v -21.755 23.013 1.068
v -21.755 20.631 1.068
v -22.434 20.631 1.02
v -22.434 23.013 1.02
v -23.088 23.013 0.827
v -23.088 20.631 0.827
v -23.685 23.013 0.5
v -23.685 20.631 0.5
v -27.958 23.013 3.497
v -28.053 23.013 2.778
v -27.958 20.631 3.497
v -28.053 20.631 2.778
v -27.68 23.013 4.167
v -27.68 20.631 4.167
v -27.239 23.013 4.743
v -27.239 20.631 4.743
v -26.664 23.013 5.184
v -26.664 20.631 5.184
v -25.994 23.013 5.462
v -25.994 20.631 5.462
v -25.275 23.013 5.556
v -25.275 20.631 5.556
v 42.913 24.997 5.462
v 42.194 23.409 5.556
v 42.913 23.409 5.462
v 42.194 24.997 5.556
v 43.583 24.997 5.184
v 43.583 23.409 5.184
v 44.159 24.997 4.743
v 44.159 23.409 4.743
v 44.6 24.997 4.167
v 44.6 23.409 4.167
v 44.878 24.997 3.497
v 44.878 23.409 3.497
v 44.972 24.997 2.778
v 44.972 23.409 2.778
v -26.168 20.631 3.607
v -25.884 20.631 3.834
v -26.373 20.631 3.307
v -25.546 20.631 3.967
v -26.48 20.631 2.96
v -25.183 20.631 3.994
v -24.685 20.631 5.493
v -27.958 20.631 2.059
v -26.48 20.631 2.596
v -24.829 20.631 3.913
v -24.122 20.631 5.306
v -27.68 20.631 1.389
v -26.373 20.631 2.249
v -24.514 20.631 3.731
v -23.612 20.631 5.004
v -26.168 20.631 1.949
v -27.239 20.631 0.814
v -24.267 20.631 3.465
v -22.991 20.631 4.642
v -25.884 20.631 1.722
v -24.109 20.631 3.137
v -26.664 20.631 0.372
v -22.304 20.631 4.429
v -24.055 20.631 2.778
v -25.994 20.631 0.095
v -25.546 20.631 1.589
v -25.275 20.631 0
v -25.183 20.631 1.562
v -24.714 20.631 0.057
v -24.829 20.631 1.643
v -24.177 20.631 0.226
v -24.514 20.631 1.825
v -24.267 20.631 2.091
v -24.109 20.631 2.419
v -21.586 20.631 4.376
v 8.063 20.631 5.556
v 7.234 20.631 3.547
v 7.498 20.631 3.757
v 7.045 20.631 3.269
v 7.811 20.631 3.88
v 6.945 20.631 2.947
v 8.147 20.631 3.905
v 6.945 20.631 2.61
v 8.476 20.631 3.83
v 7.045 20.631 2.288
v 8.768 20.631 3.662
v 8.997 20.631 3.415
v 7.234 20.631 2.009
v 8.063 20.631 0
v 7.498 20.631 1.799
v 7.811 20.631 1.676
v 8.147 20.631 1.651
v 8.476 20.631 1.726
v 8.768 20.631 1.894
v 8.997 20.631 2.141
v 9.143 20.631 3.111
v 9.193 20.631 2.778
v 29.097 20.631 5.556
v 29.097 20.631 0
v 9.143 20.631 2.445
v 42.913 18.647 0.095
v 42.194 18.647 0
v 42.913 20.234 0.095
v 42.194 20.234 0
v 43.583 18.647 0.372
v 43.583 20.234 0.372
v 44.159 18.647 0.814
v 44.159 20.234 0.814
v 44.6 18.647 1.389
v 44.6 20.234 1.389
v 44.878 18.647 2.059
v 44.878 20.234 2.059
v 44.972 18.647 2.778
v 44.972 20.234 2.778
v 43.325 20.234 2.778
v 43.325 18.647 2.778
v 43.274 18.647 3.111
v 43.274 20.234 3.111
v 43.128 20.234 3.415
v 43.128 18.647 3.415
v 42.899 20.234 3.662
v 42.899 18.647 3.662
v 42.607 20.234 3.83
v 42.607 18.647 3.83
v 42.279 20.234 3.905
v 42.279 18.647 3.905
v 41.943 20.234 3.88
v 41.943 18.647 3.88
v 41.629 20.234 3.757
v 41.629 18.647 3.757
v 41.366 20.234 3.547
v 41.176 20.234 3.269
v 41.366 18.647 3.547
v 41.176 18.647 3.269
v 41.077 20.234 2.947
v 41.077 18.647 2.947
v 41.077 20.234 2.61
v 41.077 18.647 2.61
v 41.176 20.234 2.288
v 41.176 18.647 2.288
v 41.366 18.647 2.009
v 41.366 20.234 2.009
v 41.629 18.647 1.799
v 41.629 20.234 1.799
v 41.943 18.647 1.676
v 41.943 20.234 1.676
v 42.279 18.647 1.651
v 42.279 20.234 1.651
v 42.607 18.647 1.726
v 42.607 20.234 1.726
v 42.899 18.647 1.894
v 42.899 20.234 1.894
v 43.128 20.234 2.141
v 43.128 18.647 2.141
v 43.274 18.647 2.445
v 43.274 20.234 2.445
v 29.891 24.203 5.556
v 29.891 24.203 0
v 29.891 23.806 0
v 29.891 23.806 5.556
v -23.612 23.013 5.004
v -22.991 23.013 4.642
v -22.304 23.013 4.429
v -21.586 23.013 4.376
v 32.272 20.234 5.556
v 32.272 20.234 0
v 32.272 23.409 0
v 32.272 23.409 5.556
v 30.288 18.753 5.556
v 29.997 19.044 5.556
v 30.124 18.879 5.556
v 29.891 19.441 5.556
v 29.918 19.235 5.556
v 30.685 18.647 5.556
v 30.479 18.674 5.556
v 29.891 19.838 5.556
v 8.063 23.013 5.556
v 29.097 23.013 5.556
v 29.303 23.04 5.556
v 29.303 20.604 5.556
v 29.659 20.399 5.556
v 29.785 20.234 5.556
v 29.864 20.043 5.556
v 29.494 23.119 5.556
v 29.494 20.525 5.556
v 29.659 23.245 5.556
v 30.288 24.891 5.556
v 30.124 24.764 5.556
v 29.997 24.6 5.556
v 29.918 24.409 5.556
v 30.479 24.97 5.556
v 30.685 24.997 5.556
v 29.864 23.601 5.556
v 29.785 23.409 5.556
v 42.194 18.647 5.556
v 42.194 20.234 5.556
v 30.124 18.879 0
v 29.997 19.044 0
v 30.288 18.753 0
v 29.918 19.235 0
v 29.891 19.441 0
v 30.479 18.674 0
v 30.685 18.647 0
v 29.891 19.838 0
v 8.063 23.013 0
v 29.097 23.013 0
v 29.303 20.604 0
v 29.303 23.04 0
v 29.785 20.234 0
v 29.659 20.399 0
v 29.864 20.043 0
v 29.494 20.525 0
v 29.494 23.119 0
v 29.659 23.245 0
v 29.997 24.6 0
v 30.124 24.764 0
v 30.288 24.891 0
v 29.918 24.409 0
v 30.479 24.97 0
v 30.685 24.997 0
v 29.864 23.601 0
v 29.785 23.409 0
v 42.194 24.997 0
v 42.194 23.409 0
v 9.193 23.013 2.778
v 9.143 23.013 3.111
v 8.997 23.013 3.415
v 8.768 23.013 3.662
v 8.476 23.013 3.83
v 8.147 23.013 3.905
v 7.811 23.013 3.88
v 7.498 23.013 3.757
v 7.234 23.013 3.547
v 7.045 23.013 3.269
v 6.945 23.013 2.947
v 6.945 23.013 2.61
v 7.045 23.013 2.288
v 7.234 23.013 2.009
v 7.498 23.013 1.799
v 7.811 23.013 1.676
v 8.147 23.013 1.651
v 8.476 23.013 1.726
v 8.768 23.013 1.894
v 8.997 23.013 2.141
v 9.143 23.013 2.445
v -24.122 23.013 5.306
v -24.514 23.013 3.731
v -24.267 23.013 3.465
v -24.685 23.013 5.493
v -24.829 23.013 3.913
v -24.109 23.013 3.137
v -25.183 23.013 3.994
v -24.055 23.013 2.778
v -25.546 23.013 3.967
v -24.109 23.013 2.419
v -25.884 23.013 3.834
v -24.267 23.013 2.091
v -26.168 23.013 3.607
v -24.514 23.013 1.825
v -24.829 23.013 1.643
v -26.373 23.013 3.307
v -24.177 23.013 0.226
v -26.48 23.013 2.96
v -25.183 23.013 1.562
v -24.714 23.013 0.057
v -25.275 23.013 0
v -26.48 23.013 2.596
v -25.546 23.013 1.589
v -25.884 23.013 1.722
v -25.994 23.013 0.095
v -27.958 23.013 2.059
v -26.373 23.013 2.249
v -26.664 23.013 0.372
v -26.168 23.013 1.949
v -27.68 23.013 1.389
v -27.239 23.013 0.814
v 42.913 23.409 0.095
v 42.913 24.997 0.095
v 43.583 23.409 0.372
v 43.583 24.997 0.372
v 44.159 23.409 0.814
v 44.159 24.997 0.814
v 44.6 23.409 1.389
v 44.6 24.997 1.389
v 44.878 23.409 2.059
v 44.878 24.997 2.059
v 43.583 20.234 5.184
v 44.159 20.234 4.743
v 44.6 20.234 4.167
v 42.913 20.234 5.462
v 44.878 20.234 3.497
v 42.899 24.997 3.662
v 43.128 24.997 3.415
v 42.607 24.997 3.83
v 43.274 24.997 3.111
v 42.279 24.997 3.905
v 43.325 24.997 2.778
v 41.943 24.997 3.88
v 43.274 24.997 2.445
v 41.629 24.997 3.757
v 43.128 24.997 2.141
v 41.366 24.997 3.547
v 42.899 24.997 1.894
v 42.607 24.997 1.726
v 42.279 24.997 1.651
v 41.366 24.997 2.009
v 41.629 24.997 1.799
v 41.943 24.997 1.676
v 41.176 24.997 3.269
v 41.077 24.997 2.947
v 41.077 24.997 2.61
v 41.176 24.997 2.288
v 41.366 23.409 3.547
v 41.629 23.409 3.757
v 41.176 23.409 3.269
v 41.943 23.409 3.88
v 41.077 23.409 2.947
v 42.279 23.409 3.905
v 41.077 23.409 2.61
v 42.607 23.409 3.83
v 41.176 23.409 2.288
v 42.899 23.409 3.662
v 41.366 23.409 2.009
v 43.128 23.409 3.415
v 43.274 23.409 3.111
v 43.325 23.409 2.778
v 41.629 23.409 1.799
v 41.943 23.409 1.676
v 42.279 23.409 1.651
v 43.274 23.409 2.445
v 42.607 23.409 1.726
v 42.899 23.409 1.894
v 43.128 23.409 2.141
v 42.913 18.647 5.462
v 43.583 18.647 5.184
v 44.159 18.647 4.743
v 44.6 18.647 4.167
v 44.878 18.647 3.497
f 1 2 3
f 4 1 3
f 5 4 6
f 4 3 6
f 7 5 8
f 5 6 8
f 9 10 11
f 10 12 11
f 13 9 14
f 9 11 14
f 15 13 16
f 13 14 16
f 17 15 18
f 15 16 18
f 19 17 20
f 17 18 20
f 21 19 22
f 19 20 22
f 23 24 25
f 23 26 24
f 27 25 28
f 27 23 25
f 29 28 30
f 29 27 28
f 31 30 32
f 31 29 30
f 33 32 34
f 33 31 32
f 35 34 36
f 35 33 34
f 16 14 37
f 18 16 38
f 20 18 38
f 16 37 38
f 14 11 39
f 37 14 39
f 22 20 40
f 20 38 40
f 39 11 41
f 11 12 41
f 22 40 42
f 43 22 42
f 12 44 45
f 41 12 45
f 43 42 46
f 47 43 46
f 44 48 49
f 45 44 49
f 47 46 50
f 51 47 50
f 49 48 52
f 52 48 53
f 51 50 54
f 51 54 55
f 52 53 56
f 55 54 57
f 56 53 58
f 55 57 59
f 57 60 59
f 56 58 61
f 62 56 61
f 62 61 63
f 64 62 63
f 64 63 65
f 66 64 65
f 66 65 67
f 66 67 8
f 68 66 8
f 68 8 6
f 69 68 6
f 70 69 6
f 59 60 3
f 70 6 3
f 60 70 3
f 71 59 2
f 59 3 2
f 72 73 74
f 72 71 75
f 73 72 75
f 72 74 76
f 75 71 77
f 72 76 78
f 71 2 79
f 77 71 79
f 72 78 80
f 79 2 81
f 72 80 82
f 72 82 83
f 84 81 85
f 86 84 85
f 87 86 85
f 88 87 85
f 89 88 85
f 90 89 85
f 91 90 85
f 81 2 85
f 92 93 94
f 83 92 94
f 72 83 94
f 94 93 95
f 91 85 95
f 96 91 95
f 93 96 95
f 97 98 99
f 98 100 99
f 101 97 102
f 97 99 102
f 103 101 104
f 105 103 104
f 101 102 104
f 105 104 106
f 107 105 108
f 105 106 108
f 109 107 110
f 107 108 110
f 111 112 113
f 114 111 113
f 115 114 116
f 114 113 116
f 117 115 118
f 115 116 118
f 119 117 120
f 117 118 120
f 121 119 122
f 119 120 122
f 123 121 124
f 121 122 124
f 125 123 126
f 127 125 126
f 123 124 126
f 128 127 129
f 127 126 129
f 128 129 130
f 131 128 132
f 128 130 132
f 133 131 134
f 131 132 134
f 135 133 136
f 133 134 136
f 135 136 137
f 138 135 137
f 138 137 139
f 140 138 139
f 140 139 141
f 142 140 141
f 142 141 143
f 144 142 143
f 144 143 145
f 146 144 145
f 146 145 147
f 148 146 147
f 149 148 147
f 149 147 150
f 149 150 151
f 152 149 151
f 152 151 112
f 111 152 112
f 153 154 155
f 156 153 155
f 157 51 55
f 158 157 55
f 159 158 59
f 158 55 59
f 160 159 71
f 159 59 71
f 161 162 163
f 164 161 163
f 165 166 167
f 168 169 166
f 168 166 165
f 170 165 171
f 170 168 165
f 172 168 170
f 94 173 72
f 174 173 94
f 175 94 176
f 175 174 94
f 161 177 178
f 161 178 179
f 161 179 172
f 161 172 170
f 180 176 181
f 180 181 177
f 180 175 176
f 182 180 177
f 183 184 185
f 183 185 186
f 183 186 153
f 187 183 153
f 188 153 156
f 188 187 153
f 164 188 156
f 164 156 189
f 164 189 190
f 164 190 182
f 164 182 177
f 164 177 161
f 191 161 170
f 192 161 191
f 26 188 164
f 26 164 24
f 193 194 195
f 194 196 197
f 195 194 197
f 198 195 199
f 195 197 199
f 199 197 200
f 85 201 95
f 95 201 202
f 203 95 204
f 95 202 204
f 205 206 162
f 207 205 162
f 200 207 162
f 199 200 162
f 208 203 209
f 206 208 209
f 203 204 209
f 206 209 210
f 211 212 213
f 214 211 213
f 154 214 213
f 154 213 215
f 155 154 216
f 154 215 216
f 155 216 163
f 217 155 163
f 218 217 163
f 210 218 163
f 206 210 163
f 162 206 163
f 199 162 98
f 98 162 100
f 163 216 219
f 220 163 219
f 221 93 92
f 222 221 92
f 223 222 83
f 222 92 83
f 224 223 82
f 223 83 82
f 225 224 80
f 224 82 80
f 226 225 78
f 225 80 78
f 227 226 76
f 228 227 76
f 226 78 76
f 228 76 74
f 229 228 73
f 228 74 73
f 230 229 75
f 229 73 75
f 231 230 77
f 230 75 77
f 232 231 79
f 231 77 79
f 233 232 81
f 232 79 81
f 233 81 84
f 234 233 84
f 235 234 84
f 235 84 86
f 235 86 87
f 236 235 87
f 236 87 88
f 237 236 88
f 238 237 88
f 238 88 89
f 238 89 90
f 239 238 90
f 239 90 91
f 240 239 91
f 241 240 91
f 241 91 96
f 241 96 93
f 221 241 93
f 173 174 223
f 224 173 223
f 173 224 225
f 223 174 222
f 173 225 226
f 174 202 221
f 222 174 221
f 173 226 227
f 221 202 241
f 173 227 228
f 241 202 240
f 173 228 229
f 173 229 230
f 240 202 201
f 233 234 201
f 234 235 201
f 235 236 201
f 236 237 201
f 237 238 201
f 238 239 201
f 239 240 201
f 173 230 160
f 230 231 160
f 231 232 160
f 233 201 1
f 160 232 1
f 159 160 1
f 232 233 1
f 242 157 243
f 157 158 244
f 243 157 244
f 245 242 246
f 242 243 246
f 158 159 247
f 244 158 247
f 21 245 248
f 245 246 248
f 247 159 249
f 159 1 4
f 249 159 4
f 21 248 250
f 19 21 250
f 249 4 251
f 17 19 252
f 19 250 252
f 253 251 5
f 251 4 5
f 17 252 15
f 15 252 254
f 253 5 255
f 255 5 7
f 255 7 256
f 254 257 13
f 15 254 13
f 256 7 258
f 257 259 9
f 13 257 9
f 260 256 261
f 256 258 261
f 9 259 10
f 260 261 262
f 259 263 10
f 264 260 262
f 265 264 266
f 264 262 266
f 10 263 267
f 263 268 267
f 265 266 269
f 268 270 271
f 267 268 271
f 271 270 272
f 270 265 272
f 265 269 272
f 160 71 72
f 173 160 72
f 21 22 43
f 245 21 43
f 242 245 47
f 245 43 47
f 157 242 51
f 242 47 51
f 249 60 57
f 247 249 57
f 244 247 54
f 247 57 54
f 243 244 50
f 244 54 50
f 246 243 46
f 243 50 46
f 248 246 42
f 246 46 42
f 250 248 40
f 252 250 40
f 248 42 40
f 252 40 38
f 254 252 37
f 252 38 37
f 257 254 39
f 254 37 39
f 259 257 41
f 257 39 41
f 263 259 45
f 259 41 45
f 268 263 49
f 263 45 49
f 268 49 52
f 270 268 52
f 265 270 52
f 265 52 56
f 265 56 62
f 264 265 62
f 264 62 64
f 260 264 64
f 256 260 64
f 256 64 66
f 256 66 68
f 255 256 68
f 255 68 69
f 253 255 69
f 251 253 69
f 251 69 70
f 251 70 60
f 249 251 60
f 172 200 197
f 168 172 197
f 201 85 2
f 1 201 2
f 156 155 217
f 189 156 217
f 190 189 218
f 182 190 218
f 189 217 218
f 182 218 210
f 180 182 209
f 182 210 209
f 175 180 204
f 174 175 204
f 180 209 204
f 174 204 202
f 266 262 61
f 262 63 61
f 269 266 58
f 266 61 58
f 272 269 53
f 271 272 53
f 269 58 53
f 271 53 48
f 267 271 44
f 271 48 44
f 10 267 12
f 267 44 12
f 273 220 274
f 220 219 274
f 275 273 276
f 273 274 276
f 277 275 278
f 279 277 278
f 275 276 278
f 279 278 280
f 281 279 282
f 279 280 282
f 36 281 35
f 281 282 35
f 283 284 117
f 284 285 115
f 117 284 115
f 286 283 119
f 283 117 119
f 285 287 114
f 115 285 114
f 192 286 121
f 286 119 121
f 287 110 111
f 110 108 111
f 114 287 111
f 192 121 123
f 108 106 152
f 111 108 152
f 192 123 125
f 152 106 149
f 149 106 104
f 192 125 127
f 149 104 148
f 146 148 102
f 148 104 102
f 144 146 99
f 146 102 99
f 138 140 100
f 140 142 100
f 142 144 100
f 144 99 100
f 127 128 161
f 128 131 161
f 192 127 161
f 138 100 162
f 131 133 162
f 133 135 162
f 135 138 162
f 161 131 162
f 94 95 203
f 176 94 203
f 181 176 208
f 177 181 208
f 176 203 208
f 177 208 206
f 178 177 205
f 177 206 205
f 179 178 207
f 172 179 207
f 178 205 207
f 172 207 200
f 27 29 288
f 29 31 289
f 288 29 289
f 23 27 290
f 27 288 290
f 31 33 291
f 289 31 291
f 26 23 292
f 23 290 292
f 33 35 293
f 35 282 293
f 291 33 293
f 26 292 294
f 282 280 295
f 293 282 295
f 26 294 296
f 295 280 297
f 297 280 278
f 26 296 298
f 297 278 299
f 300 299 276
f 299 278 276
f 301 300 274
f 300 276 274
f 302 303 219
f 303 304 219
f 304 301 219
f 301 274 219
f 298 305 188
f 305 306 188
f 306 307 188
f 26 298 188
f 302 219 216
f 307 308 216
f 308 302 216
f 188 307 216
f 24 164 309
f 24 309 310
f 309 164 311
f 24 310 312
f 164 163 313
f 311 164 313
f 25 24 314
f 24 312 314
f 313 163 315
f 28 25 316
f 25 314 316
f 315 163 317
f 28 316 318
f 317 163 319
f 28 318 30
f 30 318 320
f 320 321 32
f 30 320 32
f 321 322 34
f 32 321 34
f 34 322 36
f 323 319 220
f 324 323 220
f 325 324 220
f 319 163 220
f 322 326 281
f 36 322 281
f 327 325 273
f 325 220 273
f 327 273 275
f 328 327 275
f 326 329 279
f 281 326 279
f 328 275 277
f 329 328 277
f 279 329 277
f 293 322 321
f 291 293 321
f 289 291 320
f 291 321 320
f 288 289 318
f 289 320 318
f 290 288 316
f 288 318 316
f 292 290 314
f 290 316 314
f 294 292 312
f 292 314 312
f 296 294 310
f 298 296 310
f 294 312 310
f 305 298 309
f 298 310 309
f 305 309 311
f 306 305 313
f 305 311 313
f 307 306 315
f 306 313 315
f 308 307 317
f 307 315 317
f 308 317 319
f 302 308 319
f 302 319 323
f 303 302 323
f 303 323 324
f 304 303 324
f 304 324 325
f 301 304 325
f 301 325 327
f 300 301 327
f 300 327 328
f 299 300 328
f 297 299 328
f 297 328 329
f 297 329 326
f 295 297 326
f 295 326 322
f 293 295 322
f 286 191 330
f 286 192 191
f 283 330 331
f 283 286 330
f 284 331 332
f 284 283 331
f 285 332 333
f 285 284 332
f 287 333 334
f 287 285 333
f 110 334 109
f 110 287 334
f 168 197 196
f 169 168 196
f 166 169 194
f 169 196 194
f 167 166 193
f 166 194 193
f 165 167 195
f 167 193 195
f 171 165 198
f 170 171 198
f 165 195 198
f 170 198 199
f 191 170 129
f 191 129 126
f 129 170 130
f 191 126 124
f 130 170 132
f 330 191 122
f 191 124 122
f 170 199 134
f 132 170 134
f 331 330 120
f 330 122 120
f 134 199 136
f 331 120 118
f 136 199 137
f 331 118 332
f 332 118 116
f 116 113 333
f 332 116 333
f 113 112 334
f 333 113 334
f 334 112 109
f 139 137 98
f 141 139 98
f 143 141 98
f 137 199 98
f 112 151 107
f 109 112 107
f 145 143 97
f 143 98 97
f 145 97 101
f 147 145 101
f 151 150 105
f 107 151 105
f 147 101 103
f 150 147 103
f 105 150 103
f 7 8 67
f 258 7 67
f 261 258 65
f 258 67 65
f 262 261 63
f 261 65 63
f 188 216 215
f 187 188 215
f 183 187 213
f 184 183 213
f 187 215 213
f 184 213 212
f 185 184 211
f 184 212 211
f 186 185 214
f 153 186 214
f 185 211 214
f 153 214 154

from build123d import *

# Parameters (mm, degrees)
F1_DEPTH = 5.55625
F2_R     = 1.2192
F3_DEPTH = 25.4
F4_R     = 1.1303
F5_DEPTH = 25.4
F6_R     = 2.778115
F7_R     = 2.778115
F8_R     = 1.1303
F9_DEPTH = 25.4


# Not quite as in the source:
# - a fillet or chamfer is up to 0.001 mm smaller than in the source, because OpenCascade refuses the exact size
# - ends of sketch curves that miss each other by under 0.0002 mm in the source are joined


with BuildPart() as f1:
    # F0 (on Top) → F1 (new body)
    with BuildSketch(Plane.XY):
        with BuildLine():
            Line((29.0973595662, 23.0125838354), (-28.0526404338, 23.0125838354))
            Line((-28.0526404338, 23.0125838354), (-28.0526404338, 20.6313338354))
            Line((-28.0526404338, 20.6313338354), (29.0973595662, 20.6313338354))
            ThreePointArc((29.0973595662, 20.6313338354), (29.6586255738, 20.398849843), (29.8911095662, 19.8375838354))
            Line((29.8911095662, 19.8375838354), (29.8911095662, 19.4407088354))
            ThreePointArc((29.8911095662, 19.4407088354), (30.1235935587, 18.8794428278), (30.6848595662, 18.6469588354))
            Line((30.6848595662, 18.6469588354), (44.9723595662, 18.6469588354))
            Line((44.9723595662, 18.6469588354), (44.9723595662, 20.2344588354))
            Line((44.9723595662, 20.2344588354), (32.2723595662, 20.2344588354))
            Line((32.2723595662, 20.2344588354), (32.2723595662, 23.4094588354))
            Line((32.2723595662, 23.4094588354), (44.9723595662, 23.4094588354))
            Line((44.9723595662, 23.4094588354), (44.9723595662, 24.9969588354))
            Line((44.9723595662, 24.9969588354), (30.6848595662, 24.9969588354))
            ThreePointArc((30.6848595662, 24.9969588354), (30.1235935587, 24.764474843), (29.8911095662, 24.2032088354))
            Line((29.8911095662, 24.2032088354), (29.8911095662, 23.8063338354))
            ThreePointArc((29.8911095662, 23.8063338354), (29.6586255738, 23.2450678278), (29.0973595662, 23.0125838354))
        make_face()
    extrude(amount=F1_DEPTH)

    # F2 (on face) → F3 (cut)
    with BuildSketch(Plane.XZ.offset(-20.6313338354)):
        with Locations((-25.2745154338, 2.778125)):
            Circle(F2_R)
    extrude(amount=-F3_DEPTH, mode=Mode.SUBTRACT)

    # F4 (on face) → F5 (cut)
    with BuildSketch(Plane.XZ.offset(-18.6469588354)):
        with Locations((42.1942345662, 2.778125)):
            Circle(F4_R)
    extrude(amount=-F5_DEPTH, mode=Mode.SUBTRACT)

    # F6 (radius 2.778125 in the source; OpenCascade refuses exactly that, so slightly less here)
    f6_edges = [f1.edges().sort_by_distance(p)[0] for p in [
        (44.97236, 19.440709, 5.55625),
        (44.97236, 19.440709, 0),
        (44.97236, 24.203209, 0),
        (44.97236, 24.203209, 5.55625),
    ]]
    fillet(f6_edges, radius=F6_R)

    # F7 (radius 2.778125 in the source; OpenCascade refuses exactly that, so slightly less here)
    f7_edges = [f1.edges().sort_by_distance(p)[0] for p in [
        (-28.05264, 21.821959, 5.55625),
        (-28.05264, 21.821959, 0),
    ]]
    fillet(f7_edges, radius=F7_R)

    # F8 (on face) → F9 (cut)
    with BuildSketch(Plane.XZ.offset(-20.6313338354)):
        with Locations((8.0629845662, 2.778125)):
            Circle(F8_R)
        with BuildLine():
            Line((8.0629845662, 5.55625), (-25.2745254338, 5.55625))
            ThreePointArc((-25.2745254338, 5.55625), (-24.3987826977, 5.4146133255), (-23.612344628, 5.0041453791))
            ThreePointArc((-23.612344628, 5.0041453791), (-22.6534079634, 4.515722008), (-21.5864000573, 4.375682569))
            Line((-21.5864000573, 4.375682569), (8.0629845662, 5.55625))
        make_face()
        with BuildLine():
            ThreePointArc((-23.6851494527, 0.4995521366), (-24.4415033451, 0.1278289079), (-25.2745154338, 0))
            Line((-25.2745154338, 0), (8.0629845662, 0))
            Line((8.0629845662, 0), (-21.7550382738, 1.0684326083))
            ThreePointArc((-21.7550382738, 1.0684326083), (-22.7663528525, 0.9409409702), (-23.6851494527, 0.4995521366))
        make_face()
    extrude(amount=-F9_DEPTH, mode=Mode.SUBTRACT)


solid = f1.part
